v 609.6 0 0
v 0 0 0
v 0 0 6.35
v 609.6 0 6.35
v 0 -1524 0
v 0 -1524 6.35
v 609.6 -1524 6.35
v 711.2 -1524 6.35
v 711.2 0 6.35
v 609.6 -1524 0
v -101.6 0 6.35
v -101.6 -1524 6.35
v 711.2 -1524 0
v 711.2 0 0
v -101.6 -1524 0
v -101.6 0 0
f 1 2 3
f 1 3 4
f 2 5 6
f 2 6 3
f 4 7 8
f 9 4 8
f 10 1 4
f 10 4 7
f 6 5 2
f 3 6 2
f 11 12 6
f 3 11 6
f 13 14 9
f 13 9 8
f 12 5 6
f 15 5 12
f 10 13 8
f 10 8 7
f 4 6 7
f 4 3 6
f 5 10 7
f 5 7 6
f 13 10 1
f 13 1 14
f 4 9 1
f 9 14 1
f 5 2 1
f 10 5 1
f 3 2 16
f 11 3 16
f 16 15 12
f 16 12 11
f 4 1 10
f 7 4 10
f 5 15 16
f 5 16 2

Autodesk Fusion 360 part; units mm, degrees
sketch "Sketch1" plane through (0, 0, 0) normal (0, 0, 1) x (1, 0, 0)
  line L0 (0, 0) -> (609.6, 0)
  line L1 (609.6, 0) -> (609.6, -1524)
  line L2 (609.6, -1524) -> (0, -1524)
  line L3 (0, -1524) -> (0, 0)
  line L4 (711.2, 101.6) -> (711.2, -1625.6)
  line L5 (711.2, -1625.6) -> (-101.6, -1625.6)
  line L6 (-101.6, -1625.6) -> (-101.6, 101.6)
  line L7 (-101.6, 101.6) -> (711.2, 101.6)
  line L8 (-101.6, 101.6) -> (711.2, 101.6)
  line L9 (711.2, 101.6) -> (711.2, 0)
  line L10 (711.2, 0) -> (-101.6, 0)
  line L11 (-101.6, 0) -> (-101.6, 101.6)
  line L12 (-101.6, -1625.6) -> (711.2, -1625.6)
  line L13 (711.2, -1625.6) -> (711.2, -1524)
  line L14 (711.2, -1524) -> (-101.6, -1524)
  line L15 (-101.6, -1524) -> (-101.6, -1625.6)
  dimension "d1" = 609.6
  dimension "d2" = 1524
  dimension "d3" = -101.6
  dimension "d4" = 101.6
  dimension "d5" = 101.6
extrude "Extrude1" add sketch "Sketch1" along normal blind 6.35 contours L0 L1 L2 L3 L10 L14 makes body 1
extrude "Extrude1'" add sketch "Sketch1" along normal blind 6.35 separate body contours L3 L6 L10 L14 | L1 L4 L10 L14 makes body 2 at (-67.7333, -1016, 0) makes body 3 at (643.4667, -1016, 0) in component "Straight"
copy_body "CutPasteBodies1" bodies 1 removing the originals makes body 4 in component "Straight"
component "Straight" placed x (1, 0, 0) y (0, 1, 0) z (0, 0, 1) at (0, 0, 0)
